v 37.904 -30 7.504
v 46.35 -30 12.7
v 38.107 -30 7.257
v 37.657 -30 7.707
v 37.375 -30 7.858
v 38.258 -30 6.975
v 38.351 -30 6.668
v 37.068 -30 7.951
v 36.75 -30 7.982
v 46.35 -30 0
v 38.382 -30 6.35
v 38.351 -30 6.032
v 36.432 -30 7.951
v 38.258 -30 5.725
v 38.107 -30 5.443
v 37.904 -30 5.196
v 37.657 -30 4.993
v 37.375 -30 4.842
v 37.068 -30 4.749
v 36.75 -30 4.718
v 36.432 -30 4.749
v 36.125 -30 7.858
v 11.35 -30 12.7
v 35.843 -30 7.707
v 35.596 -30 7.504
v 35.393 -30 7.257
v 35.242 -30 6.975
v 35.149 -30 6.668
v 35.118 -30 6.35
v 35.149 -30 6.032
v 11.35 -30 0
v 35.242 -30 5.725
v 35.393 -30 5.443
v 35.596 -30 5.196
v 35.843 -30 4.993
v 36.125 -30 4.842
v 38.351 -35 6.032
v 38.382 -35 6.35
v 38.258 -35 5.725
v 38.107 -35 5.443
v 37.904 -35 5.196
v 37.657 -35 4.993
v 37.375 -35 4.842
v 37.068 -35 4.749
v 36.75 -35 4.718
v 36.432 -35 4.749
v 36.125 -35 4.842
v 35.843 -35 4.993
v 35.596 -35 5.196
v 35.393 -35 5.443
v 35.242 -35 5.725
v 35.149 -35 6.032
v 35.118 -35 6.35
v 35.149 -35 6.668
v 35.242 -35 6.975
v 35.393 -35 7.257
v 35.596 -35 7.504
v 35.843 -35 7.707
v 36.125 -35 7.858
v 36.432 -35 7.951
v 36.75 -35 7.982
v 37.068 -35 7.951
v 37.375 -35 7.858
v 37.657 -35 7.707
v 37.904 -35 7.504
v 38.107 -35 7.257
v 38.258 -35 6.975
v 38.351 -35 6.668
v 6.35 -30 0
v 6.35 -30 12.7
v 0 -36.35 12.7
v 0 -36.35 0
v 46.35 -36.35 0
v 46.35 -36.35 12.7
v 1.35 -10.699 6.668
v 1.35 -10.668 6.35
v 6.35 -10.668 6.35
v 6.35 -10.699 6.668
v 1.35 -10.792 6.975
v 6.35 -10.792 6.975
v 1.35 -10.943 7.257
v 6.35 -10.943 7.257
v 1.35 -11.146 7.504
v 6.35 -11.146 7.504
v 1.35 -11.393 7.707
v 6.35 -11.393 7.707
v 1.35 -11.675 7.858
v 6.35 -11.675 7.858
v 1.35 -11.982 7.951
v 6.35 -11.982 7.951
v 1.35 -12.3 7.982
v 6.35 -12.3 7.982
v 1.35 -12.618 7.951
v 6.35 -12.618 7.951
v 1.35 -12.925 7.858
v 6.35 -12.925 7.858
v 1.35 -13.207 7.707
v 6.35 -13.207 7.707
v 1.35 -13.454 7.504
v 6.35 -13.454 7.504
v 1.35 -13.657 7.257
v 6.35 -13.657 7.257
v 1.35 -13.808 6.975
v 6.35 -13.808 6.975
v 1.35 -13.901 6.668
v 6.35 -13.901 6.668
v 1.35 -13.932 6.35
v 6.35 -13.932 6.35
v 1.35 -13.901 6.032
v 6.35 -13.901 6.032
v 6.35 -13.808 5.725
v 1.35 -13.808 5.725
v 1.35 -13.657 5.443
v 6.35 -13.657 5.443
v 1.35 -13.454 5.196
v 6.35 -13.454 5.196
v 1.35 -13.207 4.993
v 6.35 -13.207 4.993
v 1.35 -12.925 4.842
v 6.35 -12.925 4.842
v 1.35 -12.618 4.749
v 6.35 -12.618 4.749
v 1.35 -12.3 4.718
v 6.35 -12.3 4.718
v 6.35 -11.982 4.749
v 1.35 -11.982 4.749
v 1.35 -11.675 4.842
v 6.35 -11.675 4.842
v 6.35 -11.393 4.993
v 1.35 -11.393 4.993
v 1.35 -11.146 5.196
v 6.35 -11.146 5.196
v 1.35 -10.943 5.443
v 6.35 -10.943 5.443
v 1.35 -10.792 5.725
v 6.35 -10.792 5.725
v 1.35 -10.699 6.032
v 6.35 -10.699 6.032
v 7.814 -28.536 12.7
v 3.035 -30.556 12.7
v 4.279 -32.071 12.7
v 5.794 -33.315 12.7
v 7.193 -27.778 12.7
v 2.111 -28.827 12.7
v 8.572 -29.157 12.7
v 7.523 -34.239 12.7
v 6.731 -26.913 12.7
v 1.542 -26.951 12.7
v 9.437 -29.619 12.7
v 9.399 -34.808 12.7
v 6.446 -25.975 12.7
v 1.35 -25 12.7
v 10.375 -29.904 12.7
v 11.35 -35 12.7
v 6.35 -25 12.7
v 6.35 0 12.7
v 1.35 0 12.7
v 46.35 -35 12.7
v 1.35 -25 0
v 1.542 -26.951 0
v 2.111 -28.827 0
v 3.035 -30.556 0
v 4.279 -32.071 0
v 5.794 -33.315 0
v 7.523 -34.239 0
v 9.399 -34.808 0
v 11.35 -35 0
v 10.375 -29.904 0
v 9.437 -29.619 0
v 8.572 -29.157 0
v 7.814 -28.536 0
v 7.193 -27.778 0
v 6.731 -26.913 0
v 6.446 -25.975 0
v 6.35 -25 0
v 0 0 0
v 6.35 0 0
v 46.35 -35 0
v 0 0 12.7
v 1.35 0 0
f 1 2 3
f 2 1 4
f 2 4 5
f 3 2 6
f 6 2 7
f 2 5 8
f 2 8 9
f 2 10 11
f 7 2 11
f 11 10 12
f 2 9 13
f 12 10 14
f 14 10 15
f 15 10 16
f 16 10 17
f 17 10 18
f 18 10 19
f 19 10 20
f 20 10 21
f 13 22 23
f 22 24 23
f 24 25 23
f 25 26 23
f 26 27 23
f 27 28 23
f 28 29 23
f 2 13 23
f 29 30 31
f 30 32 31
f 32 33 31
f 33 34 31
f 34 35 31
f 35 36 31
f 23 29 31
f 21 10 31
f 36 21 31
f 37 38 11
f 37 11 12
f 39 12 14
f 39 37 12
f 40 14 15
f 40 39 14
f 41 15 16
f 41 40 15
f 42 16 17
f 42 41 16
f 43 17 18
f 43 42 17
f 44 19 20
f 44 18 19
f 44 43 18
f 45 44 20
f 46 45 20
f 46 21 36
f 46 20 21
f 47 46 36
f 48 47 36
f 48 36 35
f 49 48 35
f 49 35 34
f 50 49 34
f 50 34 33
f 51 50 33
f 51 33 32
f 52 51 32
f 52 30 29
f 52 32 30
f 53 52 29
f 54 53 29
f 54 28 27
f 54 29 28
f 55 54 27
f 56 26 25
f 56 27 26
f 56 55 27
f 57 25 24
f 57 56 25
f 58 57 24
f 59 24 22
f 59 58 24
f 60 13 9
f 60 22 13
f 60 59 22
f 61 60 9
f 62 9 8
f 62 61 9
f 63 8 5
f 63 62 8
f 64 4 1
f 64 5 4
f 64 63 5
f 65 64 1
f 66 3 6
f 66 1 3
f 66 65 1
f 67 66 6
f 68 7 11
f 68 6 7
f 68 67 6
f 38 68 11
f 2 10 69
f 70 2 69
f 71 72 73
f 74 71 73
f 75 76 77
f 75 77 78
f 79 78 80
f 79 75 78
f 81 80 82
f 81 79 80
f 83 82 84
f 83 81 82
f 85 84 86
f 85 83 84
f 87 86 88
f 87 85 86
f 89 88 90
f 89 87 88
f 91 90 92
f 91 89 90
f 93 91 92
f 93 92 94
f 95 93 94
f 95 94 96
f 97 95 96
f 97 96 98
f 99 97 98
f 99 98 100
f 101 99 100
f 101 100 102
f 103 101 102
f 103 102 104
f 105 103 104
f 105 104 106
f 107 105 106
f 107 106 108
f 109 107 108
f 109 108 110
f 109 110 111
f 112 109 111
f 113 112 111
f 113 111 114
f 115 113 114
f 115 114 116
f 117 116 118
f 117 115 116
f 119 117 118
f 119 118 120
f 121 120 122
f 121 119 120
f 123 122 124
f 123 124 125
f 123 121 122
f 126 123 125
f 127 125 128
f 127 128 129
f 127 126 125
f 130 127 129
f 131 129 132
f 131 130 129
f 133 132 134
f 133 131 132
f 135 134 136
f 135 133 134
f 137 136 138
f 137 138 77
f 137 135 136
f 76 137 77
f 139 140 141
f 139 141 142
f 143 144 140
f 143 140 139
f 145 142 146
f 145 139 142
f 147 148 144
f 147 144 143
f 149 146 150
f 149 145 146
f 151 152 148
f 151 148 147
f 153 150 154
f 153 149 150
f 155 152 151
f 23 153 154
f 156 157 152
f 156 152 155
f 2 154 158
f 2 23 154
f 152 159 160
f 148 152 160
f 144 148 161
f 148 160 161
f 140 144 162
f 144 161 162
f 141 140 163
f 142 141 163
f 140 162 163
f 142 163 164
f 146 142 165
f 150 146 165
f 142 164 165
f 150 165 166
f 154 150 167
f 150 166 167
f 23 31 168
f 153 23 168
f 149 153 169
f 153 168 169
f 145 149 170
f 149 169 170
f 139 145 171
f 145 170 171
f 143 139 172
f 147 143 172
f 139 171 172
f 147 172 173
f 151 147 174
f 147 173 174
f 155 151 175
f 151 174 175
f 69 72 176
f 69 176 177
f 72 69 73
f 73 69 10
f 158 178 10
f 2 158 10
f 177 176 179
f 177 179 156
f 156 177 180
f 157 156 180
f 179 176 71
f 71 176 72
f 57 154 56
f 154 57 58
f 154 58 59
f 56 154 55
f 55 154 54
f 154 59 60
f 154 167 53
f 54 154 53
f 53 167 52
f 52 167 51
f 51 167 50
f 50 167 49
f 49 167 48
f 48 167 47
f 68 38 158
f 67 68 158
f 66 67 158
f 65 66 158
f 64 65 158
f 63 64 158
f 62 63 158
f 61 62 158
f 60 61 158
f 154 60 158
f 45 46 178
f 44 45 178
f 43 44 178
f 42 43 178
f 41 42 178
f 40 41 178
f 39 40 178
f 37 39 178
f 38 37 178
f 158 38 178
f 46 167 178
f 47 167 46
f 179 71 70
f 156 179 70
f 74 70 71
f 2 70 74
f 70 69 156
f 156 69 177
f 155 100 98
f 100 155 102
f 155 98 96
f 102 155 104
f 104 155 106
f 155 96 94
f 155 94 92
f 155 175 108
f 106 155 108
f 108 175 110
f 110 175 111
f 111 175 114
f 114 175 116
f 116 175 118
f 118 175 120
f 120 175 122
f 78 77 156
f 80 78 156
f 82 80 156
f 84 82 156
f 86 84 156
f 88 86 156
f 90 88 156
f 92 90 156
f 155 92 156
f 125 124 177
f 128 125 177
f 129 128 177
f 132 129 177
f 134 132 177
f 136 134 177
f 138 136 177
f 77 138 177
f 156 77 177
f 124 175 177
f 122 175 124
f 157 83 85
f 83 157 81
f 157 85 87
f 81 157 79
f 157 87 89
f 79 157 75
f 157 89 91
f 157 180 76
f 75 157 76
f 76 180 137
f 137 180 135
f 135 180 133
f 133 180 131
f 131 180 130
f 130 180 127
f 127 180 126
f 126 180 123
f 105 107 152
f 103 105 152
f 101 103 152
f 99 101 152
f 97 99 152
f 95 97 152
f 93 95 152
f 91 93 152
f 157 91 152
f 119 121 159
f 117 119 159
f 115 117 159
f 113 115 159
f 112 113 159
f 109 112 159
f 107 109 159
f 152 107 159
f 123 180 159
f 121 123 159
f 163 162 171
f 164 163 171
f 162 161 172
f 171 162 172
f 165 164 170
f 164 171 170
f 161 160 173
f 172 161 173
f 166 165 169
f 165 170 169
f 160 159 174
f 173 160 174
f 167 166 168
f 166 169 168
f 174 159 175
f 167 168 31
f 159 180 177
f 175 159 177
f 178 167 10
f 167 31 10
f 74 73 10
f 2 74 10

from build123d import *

# Parameters (mm, degrees)
SKETCH1_W               = 6.35
SKETCH1_H               = 30
BOSS_EXTRUDE1_DEPTH     = 12.7
CONVERT_SOLID1_DEPTH    = 12.7
SKETCH6_R               = 1.63195
CUT_EXTRUDE1_DEPTH      = 6.35
CUT_EXTRUDE2_DEPTH      = 61.257240229
CUT_EXTRUDE2_DEPTH_BACK = 61.257240229
SKETCH7_R               = 1.63195


# Read off the part's stored shape, not the designer's step: Convert-Solid1
with BuildPart() as part:
    # Sketch1 → Boss-Extrude1 (new body)
    with BuildSketch(Plane.XY):
        Polygon((46.35, -36.35), (46.35, -30), (6.35, -30), (0, -30), (0, -36.35), align=None)
        with Locations((3.175, -15)):
            Rectangle(SKETCH1_W, SKETCH1_H)
    extrude(amount=BOSS_EXTRUDE1_DEPTH)


with BuildPart() as body_2:
    # Convert-Solid1 outline → Convert-Solid1 (new body)
    with BuildSketch(Plane.XY):
        with BuildLine():
            Line((6.35, 0), (1.35, 0))
            Line((1.35, 0), (1.35, -25))
            ThreePointArc((1.35, -25), (4.278932188, -32.071067812), (11.35, -35))
            Line((11.35, -35), (46.35, -35))
            Line((46.35, -35), (46.35, -30))
            Line((46.35, -30), (11.35, -30))
            ThreePointArc((11.35, -30), (7.814466094, -28.535533906), (6.35, -25))
            Line((6.35, -25), (6.35, 0))
        make_face()
    extrude(amount=CONVERT_SOLID1_DEPTH)

    # Sketch6 → Cut-Extrude1 (cut)
    with BuildSketch(Plane(origin=(0, 0, 0), x_dir=(0, 0, -1), z_dir=(1, 0, 0))):
        with Locations(Location((-6.35, -12.3, 0), (0, 0, 90))):
            Circle(SKETCH6_R)
    extrude(amount=CUT_EXTRUDE1_DEPTH, mode=Mode.SUBTRACT)

    # Sketch7 → Cut-Extrude2 (cut, two sides: drawn at the far end of the back side and taken through both)
    with BuildSketch(Plane(origin=(0, 0, 0), x_dir=(1, 0, 0), z_dir=(0, 1, 0)).offset(-CUT_EXTRUDE2_DEPTH_BACK)):
        with Locations((36.75, -6.35)):
            Circle(SKETCH7_R)
        with Locations((62.15, -6.35)):
            Circle(SKETCH7_R)
    extrude(amount=CUT_EXTRUDE2_DEPTH + CUT_EXTRUDE2_DEPTH_BACK, mode=Mode.SUBTRACT)


solid = Compound([part.part, body_2.part])
